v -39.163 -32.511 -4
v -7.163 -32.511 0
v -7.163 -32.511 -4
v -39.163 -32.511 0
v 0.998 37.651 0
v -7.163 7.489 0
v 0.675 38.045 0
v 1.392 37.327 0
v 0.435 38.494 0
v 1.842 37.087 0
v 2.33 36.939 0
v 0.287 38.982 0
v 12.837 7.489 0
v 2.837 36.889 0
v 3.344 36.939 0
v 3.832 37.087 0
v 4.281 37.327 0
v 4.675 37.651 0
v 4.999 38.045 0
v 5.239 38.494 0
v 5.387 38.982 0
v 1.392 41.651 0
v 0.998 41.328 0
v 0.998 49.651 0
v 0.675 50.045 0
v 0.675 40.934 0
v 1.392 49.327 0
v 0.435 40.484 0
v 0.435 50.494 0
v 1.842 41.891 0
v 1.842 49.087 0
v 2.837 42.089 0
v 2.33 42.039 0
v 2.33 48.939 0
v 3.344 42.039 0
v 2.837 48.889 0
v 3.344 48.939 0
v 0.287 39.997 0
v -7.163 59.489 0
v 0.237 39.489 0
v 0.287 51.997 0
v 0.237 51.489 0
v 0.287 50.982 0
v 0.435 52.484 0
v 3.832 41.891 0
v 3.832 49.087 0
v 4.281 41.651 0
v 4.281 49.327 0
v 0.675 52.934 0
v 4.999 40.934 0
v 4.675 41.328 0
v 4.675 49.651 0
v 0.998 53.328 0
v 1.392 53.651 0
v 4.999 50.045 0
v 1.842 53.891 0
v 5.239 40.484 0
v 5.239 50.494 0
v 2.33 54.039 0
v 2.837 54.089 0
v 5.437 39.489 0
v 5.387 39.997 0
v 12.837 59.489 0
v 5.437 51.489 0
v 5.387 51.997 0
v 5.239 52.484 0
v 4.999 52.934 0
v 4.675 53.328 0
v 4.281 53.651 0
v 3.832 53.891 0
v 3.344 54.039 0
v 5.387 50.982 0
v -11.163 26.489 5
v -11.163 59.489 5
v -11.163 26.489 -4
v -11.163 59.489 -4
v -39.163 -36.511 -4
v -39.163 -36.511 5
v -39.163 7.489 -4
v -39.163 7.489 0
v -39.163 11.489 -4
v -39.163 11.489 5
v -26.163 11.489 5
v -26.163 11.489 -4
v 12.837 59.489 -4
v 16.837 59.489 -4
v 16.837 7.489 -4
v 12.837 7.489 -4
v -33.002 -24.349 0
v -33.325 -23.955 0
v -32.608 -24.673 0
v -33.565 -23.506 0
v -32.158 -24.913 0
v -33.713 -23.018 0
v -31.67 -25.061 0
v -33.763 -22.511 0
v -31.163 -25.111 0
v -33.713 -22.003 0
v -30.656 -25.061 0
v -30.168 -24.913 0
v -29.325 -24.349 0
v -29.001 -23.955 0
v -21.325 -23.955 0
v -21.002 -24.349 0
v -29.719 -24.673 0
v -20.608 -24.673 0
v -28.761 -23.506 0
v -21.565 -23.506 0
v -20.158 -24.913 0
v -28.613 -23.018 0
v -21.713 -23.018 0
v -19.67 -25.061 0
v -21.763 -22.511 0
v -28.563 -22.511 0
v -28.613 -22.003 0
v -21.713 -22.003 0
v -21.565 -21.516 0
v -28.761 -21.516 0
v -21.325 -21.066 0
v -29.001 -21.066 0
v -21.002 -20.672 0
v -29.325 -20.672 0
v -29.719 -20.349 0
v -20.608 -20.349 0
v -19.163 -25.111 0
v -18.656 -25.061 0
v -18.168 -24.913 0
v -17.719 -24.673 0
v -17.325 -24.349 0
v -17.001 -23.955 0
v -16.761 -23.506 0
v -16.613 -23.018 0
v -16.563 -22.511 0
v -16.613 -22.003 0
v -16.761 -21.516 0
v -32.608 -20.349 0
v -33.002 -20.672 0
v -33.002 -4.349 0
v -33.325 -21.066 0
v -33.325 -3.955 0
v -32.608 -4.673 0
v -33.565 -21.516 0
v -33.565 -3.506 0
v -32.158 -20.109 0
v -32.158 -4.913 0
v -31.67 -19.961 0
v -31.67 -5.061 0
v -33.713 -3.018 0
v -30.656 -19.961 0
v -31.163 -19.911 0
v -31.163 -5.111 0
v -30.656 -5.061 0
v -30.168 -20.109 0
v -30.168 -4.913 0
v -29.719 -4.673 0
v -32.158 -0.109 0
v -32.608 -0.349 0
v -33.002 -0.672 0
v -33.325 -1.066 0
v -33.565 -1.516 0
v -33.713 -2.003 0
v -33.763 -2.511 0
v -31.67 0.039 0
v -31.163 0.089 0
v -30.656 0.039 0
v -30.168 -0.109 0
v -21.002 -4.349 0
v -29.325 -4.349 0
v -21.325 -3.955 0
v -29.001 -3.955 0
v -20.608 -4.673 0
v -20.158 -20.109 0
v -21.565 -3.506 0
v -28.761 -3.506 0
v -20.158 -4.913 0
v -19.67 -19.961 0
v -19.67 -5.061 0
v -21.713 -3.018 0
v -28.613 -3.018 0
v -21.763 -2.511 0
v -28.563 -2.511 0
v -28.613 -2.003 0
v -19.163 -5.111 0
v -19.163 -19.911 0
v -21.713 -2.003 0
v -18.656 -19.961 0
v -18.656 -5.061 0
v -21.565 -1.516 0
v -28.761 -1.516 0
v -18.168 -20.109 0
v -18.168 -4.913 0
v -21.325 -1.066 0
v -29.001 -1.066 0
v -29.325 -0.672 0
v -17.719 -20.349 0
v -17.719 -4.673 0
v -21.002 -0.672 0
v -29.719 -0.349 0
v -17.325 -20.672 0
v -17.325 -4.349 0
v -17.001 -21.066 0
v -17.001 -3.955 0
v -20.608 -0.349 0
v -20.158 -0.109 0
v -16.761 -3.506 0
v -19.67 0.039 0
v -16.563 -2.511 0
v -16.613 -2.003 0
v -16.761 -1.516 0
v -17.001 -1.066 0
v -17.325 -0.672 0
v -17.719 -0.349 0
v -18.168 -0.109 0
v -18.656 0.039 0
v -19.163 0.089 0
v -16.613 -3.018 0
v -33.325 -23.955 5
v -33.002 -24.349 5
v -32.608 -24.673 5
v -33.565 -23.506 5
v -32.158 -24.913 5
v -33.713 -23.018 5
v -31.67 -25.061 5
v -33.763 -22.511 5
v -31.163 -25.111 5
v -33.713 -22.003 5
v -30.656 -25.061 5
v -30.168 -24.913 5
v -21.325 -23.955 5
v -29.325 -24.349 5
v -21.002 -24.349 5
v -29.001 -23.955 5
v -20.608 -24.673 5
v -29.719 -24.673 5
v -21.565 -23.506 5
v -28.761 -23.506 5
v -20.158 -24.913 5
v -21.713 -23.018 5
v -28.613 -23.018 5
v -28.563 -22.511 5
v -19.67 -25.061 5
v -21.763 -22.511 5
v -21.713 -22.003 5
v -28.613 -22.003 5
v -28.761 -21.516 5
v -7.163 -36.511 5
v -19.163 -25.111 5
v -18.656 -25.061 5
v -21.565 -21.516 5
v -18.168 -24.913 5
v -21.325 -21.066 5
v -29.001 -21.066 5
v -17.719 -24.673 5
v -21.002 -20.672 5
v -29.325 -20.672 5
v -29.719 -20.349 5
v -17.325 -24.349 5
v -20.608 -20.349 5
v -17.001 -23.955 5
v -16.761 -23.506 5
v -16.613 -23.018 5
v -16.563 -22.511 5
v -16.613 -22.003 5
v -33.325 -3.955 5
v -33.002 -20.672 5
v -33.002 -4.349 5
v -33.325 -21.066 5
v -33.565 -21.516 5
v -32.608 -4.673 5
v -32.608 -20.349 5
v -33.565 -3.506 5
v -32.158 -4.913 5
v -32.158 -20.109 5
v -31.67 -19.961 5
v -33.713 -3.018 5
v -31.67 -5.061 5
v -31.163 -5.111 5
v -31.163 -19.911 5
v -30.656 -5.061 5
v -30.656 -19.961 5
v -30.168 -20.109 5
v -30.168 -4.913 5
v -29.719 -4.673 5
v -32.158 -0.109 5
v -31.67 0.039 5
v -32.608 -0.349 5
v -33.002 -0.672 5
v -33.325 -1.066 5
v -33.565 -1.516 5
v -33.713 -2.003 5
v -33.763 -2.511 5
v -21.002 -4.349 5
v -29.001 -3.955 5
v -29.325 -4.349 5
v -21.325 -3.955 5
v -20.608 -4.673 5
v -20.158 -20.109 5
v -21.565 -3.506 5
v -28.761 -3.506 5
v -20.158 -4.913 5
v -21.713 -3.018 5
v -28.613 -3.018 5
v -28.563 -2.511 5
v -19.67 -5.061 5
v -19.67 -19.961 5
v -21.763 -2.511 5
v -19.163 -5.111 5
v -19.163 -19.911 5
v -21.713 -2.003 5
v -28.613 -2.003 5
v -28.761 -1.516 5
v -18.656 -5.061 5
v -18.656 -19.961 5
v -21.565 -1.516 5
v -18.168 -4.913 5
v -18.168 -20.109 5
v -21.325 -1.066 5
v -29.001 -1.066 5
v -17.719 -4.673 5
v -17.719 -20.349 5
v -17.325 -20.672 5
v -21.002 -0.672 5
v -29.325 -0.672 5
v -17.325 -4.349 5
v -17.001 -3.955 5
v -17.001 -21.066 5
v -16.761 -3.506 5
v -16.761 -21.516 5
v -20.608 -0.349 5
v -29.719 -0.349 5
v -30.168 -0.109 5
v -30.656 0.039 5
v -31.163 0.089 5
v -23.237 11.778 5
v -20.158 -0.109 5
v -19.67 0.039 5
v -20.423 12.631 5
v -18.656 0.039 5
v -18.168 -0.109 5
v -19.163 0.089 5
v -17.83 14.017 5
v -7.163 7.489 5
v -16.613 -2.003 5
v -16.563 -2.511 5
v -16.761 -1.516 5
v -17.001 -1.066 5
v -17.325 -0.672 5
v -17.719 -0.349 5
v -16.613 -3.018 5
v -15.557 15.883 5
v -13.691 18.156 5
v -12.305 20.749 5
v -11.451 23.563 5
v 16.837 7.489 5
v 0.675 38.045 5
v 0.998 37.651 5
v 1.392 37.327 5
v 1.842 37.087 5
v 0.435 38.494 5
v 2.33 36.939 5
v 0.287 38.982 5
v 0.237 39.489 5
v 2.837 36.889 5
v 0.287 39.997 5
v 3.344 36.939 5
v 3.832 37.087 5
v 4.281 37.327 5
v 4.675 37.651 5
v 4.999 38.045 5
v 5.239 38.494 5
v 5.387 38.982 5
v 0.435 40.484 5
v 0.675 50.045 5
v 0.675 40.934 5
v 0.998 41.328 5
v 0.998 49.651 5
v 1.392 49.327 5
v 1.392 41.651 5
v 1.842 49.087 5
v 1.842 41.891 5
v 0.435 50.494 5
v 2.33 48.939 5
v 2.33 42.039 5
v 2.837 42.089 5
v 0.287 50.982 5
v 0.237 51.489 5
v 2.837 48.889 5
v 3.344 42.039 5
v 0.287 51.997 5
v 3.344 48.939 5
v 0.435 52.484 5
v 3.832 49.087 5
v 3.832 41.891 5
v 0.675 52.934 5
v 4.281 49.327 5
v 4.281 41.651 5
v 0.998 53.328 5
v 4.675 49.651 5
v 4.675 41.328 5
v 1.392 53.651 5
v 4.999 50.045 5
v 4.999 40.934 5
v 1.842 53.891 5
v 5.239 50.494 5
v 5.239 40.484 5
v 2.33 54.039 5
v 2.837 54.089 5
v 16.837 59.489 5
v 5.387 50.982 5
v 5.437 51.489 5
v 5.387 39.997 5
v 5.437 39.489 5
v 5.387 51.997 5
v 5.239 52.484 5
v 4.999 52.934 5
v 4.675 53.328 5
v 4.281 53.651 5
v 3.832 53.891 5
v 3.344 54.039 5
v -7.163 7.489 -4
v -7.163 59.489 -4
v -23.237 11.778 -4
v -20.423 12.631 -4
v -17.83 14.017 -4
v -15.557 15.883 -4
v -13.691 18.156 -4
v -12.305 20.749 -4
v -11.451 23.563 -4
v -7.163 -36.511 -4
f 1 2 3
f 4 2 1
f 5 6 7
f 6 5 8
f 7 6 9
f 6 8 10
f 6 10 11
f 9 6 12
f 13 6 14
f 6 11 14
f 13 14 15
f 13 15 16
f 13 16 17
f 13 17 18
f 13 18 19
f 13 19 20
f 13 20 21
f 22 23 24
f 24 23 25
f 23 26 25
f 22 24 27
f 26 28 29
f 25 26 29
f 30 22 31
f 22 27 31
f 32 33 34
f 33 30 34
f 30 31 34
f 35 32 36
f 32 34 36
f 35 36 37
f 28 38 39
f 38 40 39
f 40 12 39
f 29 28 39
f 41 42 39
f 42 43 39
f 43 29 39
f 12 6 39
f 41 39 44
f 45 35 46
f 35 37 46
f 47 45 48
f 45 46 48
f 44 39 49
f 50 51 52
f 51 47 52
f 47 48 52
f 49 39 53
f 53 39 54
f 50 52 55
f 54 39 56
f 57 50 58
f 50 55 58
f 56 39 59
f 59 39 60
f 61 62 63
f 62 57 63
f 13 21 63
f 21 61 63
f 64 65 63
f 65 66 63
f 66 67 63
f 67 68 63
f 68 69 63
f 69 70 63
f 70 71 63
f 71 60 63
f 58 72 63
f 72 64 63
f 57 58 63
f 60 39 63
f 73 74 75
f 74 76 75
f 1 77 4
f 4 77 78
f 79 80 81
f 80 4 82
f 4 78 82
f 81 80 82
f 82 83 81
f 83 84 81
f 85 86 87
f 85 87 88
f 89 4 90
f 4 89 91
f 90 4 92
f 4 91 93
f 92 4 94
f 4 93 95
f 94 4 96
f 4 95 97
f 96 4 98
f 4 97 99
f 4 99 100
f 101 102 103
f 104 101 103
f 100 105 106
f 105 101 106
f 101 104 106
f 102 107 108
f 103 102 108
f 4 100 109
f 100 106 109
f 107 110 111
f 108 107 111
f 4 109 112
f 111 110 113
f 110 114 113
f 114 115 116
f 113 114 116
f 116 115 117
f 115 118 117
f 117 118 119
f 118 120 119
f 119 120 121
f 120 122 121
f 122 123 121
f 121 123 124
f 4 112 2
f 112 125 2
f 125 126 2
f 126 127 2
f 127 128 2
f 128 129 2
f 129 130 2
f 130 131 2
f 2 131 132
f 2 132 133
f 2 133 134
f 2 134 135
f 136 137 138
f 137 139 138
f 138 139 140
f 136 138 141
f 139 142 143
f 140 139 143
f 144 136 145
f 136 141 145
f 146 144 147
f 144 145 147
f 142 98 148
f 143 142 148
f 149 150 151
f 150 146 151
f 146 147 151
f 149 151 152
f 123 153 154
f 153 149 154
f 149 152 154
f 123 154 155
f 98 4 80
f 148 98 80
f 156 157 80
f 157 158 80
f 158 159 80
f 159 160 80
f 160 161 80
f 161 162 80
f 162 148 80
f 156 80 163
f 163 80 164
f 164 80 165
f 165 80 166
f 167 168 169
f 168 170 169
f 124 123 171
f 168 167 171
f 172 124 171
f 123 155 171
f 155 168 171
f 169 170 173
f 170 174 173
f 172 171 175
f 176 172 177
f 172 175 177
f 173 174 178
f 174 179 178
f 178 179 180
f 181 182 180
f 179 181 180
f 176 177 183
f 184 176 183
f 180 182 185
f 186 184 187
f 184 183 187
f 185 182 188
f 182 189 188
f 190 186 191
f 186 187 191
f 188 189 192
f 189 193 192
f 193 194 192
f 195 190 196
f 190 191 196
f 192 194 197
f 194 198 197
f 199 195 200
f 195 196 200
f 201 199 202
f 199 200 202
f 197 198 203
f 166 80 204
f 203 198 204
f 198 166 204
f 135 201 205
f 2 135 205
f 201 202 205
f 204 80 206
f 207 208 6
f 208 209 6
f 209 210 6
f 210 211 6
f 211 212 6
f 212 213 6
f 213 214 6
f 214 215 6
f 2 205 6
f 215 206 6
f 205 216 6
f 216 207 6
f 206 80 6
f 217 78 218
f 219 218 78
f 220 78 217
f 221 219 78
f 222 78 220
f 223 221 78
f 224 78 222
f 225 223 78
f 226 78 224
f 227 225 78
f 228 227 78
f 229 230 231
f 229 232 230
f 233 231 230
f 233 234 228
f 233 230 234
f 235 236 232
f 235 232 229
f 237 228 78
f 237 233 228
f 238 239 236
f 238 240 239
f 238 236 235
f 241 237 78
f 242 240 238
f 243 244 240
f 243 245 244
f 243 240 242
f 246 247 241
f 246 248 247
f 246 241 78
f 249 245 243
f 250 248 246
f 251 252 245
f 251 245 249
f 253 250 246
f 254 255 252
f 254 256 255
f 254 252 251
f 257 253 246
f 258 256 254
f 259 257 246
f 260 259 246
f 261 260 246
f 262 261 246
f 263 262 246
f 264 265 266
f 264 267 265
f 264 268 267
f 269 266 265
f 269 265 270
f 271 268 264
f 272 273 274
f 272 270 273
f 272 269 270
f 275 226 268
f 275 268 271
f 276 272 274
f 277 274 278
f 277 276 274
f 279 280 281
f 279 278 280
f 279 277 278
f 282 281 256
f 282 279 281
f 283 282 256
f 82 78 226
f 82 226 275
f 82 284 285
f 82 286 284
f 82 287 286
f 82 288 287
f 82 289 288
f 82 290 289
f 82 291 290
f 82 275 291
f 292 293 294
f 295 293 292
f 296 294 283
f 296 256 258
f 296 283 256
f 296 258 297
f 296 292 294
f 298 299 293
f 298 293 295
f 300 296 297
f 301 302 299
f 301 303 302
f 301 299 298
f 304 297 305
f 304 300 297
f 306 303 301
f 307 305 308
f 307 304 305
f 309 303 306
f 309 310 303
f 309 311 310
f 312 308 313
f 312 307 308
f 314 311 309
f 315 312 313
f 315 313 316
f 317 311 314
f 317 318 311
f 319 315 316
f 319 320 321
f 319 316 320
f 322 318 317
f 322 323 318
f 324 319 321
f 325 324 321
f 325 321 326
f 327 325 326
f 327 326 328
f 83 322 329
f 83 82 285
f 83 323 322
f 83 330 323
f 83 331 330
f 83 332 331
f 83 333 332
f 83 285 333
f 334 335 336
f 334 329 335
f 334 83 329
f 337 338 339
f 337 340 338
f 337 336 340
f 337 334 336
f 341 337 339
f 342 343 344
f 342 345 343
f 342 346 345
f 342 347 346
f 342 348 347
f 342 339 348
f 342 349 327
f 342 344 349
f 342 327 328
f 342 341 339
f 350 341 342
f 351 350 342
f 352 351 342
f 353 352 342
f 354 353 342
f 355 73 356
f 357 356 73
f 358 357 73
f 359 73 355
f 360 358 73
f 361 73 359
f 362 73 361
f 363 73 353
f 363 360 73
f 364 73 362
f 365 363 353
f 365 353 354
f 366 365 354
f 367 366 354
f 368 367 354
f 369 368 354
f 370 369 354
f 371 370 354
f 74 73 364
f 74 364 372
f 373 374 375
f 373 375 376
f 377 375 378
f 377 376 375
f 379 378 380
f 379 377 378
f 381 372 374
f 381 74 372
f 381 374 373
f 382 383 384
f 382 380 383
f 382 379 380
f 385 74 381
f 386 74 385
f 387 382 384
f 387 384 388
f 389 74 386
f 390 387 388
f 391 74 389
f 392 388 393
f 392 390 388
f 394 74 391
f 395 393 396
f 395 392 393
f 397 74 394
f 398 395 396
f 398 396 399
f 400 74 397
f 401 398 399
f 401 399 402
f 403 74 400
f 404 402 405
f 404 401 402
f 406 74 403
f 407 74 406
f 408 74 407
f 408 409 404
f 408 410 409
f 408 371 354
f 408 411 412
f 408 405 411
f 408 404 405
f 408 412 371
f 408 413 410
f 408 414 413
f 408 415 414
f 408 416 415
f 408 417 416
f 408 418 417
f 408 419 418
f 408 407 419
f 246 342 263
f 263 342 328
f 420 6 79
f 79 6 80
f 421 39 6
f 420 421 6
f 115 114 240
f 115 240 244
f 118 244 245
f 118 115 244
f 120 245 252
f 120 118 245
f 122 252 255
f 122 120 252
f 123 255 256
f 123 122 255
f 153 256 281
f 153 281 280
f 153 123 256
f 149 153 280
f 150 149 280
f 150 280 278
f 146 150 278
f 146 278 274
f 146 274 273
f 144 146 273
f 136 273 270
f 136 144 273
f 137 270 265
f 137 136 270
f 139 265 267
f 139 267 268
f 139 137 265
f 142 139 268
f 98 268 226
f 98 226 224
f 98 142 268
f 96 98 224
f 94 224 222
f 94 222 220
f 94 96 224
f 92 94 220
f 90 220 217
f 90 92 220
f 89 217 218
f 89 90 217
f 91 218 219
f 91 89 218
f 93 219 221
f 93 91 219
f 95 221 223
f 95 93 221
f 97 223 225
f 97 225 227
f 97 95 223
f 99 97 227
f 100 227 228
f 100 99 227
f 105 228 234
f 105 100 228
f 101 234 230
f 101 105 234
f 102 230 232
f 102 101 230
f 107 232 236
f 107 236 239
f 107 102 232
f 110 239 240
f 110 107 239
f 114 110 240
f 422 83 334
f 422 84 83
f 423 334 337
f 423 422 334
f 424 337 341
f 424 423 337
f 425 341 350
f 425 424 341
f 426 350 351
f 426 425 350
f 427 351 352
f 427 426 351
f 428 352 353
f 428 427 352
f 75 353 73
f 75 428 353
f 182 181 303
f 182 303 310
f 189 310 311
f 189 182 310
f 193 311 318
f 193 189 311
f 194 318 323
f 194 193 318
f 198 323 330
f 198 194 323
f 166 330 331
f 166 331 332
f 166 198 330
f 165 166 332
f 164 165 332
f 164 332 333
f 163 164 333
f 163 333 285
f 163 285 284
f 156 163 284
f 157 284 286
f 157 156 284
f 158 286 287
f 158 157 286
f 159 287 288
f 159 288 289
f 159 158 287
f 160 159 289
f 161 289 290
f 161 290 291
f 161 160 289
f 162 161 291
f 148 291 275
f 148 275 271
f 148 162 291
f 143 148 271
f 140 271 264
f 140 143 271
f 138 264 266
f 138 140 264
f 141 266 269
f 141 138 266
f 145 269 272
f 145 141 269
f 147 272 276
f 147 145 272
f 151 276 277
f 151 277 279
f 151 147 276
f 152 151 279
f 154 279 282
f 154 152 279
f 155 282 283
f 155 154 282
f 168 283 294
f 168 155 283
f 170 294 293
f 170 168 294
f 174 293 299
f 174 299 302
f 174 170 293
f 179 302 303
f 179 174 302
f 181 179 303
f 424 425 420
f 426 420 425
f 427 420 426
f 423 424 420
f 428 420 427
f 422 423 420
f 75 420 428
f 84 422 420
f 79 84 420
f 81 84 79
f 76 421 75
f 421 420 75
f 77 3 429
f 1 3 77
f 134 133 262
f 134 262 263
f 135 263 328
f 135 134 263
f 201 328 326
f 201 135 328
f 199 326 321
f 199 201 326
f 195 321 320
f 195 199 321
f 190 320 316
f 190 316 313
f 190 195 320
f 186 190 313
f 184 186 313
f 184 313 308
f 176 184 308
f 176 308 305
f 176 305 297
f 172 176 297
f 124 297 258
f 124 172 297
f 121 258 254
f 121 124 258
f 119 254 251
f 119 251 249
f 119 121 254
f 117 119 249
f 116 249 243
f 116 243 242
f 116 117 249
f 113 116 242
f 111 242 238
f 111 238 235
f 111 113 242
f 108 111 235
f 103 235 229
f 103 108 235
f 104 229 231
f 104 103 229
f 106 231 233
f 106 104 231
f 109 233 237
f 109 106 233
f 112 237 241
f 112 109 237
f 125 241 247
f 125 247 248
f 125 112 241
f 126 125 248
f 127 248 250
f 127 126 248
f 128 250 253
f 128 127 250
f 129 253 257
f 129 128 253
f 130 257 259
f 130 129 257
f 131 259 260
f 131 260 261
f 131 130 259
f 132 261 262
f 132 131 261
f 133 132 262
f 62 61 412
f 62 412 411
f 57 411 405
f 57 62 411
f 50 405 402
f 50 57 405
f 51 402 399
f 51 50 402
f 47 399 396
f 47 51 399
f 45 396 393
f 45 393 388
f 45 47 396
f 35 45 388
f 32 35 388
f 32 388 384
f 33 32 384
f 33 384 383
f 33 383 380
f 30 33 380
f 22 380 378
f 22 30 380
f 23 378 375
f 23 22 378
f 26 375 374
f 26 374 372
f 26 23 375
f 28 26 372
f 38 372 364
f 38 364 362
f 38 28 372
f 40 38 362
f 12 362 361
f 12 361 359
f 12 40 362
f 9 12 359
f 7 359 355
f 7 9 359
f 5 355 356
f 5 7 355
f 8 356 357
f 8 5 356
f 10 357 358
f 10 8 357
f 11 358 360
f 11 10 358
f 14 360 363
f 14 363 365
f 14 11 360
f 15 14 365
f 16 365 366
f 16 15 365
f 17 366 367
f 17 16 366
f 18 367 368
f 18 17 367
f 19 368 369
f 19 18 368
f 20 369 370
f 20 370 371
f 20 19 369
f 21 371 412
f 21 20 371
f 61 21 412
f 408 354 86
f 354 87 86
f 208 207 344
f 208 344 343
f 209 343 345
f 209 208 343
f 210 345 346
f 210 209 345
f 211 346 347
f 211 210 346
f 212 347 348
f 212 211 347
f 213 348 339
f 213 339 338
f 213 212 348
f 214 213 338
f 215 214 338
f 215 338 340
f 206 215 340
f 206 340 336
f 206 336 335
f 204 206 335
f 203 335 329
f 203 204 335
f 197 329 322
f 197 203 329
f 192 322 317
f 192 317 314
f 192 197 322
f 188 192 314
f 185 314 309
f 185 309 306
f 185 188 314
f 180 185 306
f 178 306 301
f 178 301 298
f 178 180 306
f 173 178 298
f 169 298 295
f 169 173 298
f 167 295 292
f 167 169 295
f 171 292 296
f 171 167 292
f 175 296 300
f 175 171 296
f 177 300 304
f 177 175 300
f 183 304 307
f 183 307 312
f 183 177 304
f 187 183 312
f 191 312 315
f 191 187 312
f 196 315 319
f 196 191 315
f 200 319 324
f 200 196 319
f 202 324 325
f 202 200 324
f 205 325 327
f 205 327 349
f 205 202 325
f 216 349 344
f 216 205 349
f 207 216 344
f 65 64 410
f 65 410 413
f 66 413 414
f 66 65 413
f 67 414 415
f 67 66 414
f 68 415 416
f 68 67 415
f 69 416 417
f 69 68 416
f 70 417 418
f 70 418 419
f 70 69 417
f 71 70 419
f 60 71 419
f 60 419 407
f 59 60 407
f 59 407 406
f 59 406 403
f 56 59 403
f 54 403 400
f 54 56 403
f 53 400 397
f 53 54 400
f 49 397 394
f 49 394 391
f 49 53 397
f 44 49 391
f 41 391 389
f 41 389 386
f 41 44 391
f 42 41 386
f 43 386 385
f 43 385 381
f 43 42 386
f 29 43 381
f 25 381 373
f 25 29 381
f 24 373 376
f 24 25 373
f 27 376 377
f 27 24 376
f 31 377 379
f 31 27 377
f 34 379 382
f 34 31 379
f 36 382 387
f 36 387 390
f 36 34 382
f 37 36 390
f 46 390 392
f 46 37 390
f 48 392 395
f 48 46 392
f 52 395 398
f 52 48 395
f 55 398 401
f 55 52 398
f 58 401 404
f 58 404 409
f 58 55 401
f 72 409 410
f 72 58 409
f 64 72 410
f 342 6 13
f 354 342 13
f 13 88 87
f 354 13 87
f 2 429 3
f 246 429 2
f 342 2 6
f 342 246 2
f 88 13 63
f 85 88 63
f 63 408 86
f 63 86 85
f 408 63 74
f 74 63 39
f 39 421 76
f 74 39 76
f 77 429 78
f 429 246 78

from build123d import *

# Parameters (mm, degrees)
SKETCH1_R           = 2.6
BOSS_EXTRUDE1_DEPTH = 5
SKETCH3_W           = 32
SKETCH3_H           = 4
SKETCH3_W_2         = 4
SKETCH3_H_2         = 52
BOSS_EXTRUDE3_DEPTH = 4
FILLET1_R           = 15


with BuildPart() as part:
    # Sketch1 → Boss-Extrude1 (new body)
    with BuildSketch(Plane.XY):
        Polygon((-11.163233534, 11.489286615), (-39.163233534, 11.489286615), (-39.163233534, -36.510713385), (-7.163233534, -36.510713385), (-7.163233534, 7.489286615), (16.836766466, 7.489286615), (16.836766466, 59.489286615), (-11.163233534, 59.489286615), align=None)
        with Locations((-31.163233534, -22.510713385)):
            Circle(SKETCH1_R, mode=Mode.SUBTRACT)
        with Locations((-19.163233534, -22.510713385)):
            Circle(SKETCH1_R, mode=Mode.SUBTRACT)
        with Locations((-31.163233534, -2.510713385)):
            Circle(SKETCH1_R, mode=Mode.SUBTRACT)
        with Locations((-19.163233534, -2.510713385)):
            Circle(SKETCH1_R, mode=Mode.SUBTRACT)
        with Locations((2.836766466, 39.489286615)):
            Circle(SKETCH1_R, mode=Mode.SUBTRACT)
        with Locations((2.836766466, 51.489286615)):
            Circle(SKETCH1_R, mode=Mode.SUBTRACT)
    extrude(amount=BOSS_EXTRUDE1_DEPTH)

    # Sketch3 → Boss-Extrude3 (add)
    with BuildSketch(Plane(origin=(0, 0, 0), x_dir=(-1, 0, 0), z_dir=(0, 0, -1))):
        with Locations((23.163233534, -34.510713385)):
            Rectangle(SKETCH3_W, SKETCH3_H)
        Polygon((39.163233534, 11.489286615), (11.163233534, 11.489286615), (11.163233534, 59.489286615), (7.163233534, 59.489286615), (7.163233534, 7.489286615), (39.163233534, 7.489286615), align=None)
        with Locations((-14.836766466, 33.489286615)):
            Rectangle(SKETCH3_W_2, SKETCH3_H_2)
    extrude(amount=BOSS_EXTRUDE3_DEPTH)

    # Fillet1
    fillet1_edges = [part.edges().sort_by_distance(p)[0] for p in [
        (-11.163233534, 11.489286615, 0.5),
    ]]
    fillet(fillet1_edges, radius=FILLET1_R)


solid = part.part
